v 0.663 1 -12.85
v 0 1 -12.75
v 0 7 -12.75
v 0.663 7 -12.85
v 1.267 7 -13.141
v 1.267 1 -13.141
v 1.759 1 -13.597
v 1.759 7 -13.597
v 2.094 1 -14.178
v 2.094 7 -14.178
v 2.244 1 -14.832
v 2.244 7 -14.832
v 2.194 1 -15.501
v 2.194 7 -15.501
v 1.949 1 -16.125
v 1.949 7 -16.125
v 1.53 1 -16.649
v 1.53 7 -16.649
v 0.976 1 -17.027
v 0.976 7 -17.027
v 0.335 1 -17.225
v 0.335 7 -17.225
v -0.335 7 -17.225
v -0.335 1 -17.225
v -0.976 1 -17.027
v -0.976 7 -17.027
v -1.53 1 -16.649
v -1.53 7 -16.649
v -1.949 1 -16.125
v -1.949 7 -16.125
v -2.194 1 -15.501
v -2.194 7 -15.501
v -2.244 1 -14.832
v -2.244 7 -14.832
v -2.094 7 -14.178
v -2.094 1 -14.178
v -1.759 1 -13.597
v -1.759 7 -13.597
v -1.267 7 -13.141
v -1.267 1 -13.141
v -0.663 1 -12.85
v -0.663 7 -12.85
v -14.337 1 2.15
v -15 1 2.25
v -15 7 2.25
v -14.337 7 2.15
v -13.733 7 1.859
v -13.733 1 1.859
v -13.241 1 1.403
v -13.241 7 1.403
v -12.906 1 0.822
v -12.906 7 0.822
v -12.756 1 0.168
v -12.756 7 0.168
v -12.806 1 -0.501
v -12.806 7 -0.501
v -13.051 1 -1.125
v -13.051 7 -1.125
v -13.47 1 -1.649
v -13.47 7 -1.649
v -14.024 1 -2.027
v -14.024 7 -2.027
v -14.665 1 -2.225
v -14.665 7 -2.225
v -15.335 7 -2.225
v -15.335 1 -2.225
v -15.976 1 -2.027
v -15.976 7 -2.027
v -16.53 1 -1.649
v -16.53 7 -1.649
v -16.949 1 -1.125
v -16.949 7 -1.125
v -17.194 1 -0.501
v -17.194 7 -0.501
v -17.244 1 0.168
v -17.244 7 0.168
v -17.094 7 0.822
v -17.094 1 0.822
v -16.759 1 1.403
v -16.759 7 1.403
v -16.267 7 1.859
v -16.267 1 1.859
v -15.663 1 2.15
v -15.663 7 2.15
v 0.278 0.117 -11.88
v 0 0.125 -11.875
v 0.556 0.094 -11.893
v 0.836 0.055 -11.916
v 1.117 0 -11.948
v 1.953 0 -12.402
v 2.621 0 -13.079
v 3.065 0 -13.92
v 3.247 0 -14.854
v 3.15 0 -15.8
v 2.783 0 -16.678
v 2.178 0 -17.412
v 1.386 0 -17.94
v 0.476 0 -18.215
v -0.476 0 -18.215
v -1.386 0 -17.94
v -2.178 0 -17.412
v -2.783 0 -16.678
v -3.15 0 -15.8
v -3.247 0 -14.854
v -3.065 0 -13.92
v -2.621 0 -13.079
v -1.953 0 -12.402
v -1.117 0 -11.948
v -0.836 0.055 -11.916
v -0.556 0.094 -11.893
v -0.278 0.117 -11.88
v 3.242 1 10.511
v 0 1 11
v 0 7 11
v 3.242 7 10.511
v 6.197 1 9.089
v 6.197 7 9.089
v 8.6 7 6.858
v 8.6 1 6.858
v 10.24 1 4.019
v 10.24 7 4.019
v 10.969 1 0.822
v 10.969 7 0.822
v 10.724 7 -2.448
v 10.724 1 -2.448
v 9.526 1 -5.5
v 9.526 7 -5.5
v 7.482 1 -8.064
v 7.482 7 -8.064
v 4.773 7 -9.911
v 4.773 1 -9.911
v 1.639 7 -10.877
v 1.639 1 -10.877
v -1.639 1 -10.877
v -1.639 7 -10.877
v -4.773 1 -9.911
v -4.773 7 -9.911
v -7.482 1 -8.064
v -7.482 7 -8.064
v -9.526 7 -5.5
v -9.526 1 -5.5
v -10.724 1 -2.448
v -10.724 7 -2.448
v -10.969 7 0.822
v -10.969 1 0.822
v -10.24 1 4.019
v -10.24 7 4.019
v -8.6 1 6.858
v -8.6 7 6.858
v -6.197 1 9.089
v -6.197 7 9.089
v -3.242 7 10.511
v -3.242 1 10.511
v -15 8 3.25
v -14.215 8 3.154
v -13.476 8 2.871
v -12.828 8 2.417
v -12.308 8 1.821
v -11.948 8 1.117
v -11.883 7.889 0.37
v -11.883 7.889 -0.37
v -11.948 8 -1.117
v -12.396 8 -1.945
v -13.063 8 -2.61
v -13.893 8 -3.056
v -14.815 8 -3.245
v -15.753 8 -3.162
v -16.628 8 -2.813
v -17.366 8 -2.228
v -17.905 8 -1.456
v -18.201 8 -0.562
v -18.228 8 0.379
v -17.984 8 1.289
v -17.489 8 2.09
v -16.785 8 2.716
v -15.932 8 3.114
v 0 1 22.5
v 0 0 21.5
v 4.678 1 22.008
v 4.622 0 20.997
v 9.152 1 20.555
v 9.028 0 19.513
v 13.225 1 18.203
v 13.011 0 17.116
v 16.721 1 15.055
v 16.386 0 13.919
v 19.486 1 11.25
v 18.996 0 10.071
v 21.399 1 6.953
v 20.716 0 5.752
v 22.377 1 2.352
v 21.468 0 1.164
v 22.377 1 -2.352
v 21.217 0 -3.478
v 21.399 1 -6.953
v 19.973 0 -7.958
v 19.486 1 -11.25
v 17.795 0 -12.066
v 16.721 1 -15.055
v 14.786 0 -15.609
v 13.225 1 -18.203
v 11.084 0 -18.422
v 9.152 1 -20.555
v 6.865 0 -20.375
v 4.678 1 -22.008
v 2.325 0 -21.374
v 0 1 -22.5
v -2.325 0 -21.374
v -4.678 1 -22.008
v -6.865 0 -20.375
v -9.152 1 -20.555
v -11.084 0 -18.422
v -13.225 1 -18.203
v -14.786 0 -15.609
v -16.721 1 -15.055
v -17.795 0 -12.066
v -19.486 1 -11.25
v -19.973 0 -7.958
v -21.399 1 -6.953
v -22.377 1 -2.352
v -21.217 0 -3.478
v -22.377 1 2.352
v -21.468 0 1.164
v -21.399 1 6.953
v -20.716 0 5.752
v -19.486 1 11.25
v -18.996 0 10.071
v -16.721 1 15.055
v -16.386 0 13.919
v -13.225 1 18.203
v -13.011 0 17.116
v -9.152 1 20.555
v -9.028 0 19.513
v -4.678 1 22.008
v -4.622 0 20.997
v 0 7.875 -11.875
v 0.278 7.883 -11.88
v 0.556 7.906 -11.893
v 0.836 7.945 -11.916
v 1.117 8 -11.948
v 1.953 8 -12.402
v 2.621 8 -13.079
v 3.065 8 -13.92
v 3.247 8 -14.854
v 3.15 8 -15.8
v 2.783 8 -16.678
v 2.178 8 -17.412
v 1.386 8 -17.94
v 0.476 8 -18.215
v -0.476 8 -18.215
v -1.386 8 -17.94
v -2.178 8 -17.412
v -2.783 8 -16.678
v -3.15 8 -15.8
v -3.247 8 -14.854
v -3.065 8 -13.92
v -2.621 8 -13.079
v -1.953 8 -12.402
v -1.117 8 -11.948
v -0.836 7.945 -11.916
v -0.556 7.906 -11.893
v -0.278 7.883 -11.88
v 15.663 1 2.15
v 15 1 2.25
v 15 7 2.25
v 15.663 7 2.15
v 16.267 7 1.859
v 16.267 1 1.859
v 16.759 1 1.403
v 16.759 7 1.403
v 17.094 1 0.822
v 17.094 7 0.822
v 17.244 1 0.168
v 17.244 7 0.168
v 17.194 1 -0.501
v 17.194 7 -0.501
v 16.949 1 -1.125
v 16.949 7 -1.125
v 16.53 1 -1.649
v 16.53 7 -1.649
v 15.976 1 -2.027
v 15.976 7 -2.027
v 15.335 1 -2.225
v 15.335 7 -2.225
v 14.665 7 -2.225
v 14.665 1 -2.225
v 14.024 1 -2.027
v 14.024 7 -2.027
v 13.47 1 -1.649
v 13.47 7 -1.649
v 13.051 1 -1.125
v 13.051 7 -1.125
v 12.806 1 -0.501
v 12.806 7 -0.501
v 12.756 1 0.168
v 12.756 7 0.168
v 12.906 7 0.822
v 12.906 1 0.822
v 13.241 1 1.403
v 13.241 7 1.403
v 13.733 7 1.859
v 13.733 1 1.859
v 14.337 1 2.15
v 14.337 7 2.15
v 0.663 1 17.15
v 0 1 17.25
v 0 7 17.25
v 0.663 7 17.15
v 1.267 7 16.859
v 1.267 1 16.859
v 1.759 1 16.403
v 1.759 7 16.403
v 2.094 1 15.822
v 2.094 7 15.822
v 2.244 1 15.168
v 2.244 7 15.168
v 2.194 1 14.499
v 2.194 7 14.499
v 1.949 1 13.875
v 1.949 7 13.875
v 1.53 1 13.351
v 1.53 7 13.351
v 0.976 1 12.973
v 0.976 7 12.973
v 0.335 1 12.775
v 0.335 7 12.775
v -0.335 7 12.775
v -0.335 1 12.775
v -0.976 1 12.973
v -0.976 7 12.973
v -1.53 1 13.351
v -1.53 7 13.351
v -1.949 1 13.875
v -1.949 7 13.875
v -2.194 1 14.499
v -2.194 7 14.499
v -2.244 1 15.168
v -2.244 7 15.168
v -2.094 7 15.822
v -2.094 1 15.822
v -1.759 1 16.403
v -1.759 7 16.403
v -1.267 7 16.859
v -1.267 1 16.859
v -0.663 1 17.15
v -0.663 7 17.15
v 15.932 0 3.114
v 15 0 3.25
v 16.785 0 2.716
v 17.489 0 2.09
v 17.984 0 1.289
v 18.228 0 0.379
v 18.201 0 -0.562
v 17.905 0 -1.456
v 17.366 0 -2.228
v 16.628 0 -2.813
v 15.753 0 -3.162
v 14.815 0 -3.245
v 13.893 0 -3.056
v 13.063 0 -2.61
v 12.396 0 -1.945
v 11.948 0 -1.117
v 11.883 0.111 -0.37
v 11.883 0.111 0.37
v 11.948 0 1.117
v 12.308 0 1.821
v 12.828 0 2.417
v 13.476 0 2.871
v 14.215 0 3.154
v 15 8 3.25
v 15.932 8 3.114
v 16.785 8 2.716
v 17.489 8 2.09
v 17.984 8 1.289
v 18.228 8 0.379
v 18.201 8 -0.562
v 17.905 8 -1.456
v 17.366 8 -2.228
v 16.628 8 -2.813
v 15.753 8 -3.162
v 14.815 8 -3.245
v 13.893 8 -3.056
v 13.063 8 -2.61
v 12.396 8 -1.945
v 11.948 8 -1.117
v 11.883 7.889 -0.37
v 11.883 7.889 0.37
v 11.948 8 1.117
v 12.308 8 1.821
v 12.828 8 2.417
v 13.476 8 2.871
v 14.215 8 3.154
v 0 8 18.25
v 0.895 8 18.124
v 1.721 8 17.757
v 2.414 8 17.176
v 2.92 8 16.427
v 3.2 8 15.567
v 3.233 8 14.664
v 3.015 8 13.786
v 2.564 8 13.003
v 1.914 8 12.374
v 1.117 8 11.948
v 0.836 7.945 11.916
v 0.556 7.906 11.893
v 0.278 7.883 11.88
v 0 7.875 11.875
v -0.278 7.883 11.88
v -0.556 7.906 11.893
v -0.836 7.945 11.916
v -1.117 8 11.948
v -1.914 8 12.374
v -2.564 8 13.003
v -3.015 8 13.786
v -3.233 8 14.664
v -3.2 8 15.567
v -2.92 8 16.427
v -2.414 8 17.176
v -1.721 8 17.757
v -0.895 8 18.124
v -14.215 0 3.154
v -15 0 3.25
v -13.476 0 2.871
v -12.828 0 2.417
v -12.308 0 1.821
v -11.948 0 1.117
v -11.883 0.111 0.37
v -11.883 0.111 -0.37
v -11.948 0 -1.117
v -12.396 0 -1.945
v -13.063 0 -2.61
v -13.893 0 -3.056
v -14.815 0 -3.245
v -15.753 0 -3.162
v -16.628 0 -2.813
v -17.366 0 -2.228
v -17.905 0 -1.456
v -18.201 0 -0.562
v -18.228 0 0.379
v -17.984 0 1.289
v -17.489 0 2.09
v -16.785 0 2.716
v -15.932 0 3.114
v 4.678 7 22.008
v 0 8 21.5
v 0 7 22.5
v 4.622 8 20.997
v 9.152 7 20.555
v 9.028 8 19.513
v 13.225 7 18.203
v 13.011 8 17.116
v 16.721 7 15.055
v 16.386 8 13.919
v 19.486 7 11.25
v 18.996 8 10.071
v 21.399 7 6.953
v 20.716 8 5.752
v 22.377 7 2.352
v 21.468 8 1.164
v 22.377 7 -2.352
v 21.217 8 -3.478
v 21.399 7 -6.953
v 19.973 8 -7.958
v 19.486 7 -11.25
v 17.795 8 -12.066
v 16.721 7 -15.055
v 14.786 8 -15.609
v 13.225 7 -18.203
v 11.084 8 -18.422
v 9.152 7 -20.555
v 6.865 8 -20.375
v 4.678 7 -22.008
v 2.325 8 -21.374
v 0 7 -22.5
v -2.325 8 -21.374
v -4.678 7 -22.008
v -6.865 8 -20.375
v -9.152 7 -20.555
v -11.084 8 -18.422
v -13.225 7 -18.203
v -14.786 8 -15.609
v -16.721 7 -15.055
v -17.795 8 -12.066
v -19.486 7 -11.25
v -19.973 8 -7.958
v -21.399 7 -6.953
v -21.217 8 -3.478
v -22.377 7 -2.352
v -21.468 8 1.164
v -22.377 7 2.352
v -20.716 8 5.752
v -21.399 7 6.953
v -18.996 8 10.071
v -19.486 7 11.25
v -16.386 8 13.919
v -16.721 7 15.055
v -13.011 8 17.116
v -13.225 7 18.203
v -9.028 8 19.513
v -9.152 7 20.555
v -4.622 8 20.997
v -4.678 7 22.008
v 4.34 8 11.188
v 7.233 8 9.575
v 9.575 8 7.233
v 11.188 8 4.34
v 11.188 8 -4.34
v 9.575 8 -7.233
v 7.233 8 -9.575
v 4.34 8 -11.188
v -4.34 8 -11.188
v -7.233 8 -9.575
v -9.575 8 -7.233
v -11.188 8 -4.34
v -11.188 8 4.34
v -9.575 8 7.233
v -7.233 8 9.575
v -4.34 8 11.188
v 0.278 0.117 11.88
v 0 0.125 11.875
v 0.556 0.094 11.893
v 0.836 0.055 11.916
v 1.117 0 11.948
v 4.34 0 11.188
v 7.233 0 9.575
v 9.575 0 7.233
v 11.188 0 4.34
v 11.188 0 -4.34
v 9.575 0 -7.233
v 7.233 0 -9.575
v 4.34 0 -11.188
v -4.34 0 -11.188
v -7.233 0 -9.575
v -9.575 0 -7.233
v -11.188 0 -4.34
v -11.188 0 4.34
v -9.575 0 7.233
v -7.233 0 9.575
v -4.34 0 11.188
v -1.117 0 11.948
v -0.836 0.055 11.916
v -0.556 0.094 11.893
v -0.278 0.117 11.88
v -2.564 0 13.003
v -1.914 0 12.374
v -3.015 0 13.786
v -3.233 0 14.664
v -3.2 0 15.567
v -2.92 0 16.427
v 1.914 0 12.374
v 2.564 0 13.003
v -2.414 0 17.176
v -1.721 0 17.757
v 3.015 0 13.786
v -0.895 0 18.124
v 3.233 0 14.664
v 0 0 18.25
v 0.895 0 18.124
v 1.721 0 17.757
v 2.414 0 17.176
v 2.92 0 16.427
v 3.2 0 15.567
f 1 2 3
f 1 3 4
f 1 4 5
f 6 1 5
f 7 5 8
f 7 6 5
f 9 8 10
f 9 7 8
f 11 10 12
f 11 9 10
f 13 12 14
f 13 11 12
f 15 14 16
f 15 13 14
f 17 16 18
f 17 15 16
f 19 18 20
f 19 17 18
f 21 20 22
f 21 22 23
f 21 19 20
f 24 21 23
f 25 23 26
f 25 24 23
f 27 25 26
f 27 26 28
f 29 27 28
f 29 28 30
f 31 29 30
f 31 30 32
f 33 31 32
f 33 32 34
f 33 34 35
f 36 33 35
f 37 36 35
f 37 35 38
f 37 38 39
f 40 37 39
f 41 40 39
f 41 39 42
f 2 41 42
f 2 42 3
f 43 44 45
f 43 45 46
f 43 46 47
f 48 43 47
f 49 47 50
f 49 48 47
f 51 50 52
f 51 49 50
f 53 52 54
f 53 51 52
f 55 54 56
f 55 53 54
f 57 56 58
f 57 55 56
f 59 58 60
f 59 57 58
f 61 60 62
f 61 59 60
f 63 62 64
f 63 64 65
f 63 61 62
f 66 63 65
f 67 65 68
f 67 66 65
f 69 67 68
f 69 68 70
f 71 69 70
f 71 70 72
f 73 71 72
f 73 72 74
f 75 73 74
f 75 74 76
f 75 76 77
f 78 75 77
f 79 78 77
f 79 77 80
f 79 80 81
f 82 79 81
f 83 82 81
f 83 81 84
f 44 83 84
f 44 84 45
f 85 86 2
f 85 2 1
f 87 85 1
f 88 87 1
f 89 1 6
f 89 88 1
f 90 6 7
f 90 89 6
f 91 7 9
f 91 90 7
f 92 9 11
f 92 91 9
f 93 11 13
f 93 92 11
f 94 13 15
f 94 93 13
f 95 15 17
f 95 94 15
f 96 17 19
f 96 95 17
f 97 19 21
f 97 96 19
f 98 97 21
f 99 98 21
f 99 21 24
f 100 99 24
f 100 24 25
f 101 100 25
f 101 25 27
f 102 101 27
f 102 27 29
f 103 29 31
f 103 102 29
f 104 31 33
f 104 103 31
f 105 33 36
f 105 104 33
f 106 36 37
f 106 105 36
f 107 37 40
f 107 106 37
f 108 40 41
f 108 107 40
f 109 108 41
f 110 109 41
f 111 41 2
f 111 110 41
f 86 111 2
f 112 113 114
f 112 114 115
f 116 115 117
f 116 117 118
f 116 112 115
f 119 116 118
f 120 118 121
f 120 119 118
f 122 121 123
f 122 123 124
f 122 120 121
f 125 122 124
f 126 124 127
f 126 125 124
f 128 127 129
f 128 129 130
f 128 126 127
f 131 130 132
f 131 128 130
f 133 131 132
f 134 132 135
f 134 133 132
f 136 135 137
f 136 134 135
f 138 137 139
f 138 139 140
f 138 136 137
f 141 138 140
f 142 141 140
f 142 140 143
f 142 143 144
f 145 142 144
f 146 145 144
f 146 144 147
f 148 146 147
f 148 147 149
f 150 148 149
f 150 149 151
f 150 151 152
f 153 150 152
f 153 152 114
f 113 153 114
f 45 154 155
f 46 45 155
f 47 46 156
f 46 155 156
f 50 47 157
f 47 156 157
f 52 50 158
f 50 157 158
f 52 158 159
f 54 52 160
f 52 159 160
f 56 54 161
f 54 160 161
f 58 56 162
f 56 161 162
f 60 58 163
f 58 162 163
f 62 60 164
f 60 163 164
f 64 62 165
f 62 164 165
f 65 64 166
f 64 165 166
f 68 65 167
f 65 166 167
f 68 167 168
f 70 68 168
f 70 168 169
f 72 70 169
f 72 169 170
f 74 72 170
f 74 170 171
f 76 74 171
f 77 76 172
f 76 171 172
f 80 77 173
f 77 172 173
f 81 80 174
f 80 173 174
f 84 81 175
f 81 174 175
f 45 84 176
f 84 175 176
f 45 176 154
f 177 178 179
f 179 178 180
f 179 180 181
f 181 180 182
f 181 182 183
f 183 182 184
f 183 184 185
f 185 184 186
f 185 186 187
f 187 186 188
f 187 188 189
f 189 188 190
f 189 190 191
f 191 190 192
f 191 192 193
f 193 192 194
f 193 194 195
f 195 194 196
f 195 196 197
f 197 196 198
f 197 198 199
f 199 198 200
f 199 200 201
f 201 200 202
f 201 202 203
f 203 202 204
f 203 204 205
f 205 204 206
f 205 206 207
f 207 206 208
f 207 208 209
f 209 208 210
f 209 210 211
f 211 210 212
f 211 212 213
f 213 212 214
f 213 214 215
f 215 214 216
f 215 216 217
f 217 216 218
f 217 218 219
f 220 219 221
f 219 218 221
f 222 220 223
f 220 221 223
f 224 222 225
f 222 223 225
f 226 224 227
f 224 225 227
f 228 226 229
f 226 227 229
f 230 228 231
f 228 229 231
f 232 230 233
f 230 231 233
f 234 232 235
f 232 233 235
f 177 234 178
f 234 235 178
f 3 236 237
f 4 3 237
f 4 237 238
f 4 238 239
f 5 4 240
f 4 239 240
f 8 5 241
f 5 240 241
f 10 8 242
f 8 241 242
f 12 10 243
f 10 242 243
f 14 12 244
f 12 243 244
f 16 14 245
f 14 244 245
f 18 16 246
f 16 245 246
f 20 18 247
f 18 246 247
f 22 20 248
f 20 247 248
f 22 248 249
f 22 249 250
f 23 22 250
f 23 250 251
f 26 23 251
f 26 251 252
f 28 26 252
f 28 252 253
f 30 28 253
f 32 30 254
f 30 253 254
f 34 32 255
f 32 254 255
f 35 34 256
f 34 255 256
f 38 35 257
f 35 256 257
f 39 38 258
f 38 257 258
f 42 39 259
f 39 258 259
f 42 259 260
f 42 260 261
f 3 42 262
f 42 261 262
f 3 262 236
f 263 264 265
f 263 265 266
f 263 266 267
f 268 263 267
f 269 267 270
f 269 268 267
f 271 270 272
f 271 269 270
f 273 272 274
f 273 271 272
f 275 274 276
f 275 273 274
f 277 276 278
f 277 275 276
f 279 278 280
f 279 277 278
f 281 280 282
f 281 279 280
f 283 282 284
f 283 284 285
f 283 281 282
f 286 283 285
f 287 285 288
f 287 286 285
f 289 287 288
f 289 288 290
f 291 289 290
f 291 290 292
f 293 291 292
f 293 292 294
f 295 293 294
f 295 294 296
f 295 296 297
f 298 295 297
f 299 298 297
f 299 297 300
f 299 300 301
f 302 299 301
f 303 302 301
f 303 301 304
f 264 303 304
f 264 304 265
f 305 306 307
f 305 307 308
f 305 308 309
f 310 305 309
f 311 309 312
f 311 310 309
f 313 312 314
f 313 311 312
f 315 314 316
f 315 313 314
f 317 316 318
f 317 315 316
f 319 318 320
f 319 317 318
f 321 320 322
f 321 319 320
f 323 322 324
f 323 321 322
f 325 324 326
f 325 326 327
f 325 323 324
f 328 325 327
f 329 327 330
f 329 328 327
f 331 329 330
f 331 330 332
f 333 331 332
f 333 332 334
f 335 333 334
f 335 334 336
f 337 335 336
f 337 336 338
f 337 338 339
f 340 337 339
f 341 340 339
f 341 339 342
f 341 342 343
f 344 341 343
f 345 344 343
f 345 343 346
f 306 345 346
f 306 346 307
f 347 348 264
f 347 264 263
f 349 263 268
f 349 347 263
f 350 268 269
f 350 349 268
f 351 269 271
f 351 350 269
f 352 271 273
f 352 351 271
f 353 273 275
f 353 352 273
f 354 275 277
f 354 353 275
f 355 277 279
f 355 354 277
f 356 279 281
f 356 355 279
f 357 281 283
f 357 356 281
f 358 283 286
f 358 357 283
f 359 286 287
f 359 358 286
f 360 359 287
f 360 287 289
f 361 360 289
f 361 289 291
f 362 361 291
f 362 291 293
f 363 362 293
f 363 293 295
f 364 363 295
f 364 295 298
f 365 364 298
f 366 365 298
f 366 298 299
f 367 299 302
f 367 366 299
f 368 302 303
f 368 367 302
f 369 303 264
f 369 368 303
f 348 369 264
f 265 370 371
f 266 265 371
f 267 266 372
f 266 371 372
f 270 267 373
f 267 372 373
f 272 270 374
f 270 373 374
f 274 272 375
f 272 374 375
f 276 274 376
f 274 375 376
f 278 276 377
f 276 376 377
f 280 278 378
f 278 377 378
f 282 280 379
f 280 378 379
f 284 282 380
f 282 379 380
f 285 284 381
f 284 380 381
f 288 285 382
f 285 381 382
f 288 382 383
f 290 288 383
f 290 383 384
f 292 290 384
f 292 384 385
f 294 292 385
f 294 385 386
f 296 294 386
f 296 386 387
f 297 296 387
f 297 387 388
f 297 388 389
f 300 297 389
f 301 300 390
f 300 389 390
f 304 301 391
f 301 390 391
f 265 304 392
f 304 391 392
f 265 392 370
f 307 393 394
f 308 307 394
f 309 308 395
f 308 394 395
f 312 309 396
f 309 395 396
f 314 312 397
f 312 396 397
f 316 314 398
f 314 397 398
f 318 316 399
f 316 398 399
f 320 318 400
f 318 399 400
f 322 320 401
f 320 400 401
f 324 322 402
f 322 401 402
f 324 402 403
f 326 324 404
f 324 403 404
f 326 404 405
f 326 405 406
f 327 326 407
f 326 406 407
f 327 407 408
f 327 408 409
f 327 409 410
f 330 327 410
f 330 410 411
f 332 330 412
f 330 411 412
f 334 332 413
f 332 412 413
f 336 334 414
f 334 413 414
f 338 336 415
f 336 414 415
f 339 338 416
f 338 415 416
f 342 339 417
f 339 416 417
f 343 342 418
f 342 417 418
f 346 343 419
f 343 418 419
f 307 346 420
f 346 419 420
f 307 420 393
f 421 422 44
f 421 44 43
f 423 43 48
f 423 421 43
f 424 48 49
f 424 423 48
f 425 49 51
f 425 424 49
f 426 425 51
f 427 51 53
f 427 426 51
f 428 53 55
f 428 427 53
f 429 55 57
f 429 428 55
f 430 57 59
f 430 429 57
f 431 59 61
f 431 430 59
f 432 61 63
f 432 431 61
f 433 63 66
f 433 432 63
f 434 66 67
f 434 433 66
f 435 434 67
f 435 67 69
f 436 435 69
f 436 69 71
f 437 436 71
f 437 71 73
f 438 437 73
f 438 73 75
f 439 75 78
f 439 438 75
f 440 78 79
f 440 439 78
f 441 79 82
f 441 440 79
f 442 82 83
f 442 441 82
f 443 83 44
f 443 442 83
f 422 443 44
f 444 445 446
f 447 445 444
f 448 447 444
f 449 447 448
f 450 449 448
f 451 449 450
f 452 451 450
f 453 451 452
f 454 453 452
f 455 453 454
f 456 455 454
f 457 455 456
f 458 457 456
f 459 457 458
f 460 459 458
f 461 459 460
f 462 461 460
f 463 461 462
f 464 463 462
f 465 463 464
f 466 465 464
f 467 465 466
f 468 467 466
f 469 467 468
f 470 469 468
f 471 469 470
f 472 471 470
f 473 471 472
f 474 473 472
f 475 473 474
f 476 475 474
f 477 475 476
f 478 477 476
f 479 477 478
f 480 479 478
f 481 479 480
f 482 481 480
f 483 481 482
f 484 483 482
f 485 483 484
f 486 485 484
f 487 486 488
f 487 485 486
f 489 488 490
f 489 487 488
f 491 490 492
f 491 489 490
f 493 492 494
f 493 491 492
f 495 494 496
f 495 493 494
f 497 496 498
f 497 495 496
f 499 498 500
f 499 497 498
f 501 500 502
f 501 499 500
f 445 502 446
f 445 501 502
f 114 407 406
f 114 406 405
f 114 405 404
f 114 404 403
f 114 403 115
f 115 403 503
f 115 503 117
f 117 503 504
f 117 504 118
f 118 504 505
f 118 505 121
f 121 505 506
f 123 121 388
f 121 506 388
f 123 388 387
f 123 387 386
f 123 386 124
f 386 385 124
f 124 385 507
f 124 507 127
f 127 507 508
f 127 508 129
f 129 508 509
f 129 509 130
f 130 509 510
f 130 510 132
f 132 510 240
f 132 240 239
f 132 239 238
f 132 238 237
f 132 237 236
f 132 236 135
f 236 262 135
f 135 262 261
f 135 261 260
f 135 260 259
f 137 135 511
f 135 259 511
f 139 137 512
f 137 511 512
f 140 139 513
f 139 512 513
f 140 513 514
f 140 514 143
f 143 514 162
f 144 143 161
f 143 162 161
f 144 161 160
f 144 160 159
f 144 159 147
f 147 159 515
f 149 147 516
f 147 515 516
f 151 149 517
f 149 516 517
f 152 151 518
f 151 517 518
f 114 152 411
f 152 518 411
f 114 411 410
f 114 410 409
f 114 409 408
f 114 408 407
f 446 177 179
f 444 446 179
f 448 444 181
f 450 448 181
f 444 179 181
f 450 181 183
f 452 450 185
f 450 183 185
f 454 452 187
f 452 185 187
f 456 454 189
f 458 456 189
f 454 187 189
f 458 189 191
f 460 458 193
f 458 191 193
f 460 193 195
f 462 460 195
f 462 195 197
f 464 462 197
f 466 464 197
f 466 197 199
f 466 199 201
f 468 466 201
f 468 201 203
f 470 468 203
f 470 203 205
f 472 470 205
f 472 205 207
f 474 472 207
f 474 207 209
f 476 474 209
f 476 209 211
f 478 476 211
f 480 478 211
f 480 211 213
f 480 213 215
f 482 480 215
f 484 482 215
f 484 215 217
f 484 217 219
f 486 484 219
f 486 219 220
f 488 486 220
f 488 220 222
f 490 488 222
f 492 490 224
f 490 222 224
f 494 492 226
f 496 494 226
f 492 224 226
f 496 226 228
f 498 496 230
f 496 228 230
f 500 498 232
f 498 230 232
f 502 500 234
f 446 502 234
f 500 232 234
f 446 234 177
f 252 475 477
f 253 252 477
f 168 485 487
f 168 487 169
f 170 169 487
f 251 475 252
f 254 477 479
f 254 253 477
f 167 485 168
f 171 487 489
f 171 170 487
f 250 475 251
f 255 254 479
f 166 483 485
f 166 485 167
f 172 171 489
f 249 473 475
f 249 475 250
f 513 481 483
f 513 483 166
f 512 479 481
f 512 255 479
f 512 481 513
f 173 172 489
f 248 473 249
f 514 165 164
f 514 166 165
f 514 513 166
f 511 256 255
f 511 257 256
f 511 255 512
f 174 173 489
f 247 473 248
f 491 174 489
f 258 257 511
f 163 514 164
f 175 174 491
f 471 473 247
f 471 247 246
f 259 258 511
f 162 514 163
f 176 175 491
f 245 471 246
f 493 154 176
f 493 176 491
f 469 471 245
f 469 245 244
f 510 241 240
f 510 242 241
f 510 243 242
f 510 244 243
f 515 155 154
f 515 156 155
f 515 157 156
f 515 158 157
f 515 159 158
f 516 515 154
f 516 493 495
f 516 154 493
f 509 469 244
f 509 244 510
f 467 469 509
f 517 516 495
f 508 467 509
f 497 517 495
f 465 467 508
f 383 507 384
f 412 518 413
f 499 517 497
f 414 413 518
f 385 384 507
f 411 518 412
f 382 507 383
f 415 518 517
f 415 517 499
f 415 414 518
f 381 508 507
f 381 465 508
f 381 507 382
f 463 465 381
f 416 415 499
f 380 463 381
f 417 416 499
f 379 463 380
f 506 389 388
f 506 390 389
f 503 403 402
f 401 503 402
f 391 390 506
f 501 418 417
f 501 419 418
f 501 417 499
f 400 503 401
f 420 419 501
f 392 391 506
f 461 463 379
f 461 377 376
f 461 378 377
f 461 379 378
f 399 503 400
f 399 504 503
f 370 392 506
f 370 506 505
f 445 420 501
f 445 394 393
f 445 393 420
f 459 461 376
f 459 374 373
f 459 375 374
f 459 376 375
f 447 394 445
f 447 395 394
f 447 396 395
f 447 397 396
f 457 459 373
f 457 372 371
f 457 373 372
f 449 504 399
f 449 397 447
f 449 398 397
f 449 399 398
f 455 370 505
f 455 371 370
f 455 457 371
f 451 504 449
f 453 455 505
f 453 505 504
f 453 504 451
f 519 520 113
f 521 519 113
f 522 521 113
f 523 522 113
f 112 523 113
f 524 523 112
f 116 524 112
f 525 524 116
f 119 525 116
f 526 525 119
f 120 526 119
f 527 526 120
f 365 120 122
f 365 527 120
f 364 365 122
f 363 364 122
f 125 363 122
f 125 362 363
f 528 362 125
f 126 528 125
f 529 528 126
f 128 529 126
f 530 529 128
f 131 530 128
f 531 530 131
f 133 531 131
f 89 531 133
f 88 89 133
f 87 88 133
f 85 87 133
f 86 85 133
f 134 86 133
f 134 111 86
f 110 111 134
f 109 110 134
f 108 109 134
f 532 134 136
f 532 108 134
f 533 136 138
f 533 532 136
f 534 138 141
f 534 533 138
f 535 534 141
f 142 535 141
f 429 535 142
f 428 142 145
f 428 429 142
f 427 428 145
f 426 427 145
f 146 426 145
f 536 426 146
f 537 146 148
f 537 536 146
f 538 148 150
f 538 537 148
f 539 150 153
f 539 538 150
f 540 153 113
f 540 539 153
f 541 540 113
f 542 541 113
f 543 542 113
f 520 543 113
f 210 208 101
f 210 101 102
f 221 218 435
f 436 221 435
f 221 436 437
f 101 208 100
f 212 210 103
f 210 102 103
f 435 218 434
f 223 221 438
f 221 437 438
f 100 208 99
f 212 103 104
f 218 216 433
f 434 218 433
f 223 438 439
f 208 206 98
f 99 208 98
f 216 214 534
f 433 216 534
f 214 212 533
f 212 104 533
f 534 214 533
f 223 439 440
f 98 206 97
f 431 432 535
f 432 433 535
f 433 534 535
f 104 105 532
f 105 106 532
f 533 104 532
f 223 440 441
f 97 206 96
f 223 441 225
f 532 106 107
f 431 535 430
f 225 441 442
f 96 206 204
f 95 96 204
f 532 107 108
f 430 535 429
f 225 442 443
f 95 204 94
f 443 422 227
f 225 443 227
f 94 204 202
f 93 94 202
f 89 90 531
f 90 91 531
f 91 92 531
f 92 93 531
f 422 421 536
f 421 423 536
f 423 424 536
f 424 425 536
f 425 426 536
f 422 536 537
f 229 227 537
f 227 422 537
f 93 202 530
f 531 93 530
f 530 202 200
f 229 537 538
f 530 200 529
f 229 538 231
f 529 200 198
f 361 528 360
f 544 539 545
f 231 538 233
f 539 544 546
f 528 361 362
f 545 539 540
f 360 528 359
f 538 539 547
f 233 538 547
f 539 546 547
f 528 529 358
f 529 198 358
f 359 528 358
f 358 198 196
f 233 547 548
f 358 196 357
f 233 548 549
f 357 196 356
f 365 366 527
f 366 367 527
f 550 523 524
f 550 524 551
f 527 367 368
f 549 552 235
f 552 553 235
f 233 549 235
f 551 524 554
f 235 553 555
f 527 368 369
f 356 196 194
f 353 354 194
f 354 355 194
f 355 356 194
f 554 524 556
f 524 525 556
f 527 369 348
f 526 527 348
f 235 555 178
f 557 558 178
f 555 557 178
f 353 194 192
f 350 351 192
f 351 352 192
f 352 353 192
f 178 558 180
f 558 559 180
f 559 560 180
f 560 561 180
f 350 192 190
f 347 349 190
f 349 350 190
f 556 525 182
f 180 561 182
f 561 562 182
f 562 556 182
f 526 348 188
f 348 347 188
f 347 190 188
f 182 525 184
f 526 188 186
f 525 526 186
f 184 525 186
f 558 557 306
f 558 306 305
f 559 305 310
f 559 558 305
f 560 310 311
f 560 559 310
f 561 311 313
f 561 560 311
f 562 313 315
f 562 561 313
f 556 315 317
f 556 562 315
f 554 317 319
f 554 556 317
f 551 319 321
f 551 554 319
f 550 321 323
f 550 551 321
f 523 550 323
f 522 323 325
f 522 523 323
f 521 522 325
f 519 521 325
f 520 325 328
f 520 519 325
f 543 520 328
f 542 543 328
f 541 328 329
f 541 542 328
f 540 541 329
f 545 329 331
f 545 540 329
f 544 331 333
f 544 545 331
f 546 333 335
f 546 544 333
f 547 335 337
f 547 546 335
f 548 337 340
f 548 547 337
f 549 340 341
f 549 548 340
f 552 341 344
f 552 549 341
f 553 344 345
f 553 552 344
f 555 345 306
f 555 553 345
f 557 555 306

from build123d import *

# Parameters (mm, degrees)
SKETCH1_R           = 22.5
SKETCH1_R_2         = 11
SKETCH1_R_3         = 2.25
BOSS_EXTRUDE1_DEPTH = 8
CHAMFER1_SIZE       = 1


with BuildPart() as part:
    # Sketch1 → Boss-Extrude1 (new body)
    with BuildSketch(Plane(origin=(0, 0, 0), x_dir=(1, 0, 0), z_dir=(0, 1, 0))):
        with Locations(Location((0, 0, 0), (0, 0, 270))):
            Circle(SKETCH1_R)
        with Locations(Location((0, 0, 0), (0, 0, 270))):
            Circle(SKETCH1_R_2, mode=Mode.SUBTRACT)
        with Locations(Location((-15, 0, 0), (0, 0, 270))):
            Circle(SKETCH1_R_3, mode=Mode.SUBTRACT)
        with Locations(Location((15, 0, 0), (0, 0, 270))):
            Circle(SKETCH1_R_3, mode=Mode.SUBTRACT)
        with Locations(Location((0, -15, 0), (0, 0, 270))):
            Circle(SKETCH1_R_3, mode=Mode.SUBTRACT)
        with Locations(Location((0, 15, 0), (0, 0, 270))):
            Circle(SKETCH1_R_3, mode=Mode.SUBTRACT)
    extrude(amount=BOSS_EXTRUDE1_DEPTH)

    # Chamfer1
    # the kernel refuses this chamfer: 1 mm, written as the material it takes off along each edge
    with BuildSketch(Plane(origin=(15, 0, 0), x_dir=(0, 0, 1), z_dir=(-1, 0, 0))) as chamfer1_piece_1:
        Polygon((2.25, CHAMFER1_SIZE), (2.25 + CHAMFER1_SIZE, 0), (2.25, 0), align=None)
    revolve(axis=Axis((15, 0, 0), (0, 1, 0)), mode=Mode.SUBTRACT)
    with BuildSketch(Plane(origin=(15, 8, 0), x_dir=(0, 0, 1), z_dir=(-1, 0, 0))) as chamfer1_piece_2:
        Polygon((2.25, -CHAMFER1_SIZE), (2.25 + CHAMFER1_SIZE, 0), (2.25, 0), align=None)
    revolve(axis=Axis((15, 8, 0), (0, 1, 0)), mode=Mode.SUBTRACT)
    with BuildSketch(Plane(origin=(0, 0, -15), x_dir=(0, 0, 1), z_dir=(-1, 0, 0))) as chamfer1_piece_3:
        Polygon((2.25, CHAMFER1_SIZE), (2.25 + CHAMFER1_SIZE, 0), (2.25, 0), align=None)
    revolve(axis=Axis((0, 0, -15), (0, 1, 0)), mode=Mode.SUBTRACT)
    with BuildSketch(Plane(origin=(0, 8, -15), x_dir=(0, 0, 1), z_dir=(-1, 0, 0))) as chamfer1_piece_4:
        Polygon((2.25, -CHAMFER1_SIZE), (2.25 + CHAMFER1_SIZE, 0), (2.25, 0), align=None)
    revolve(axis=Axis((0, 8, -15), (0, 1, 0)), mode=Mode.SUBTRACT)
    with BuildSketch(Plane(origin=(0, 0, 0), x_dir=(0, 0, 1), z_dir=(-1, 0, 0))) as chamfer1_piece_5:
        Polygon((22.5, CHAMFER1_SIZE), (22.5 - CHAMFER1_SIZE, 0), (22.5, 0), align=None)
    revolve(axis=Axis((0, 0, 0), (0, 1, 0)), mode=Mode.SUBTRACT)
    with BuildSketch(Plane(origin=(-15, 0, 0), x_dir=(0, 0, 1), z_dir=(-1, 0, 0))) as chamfer1_piece_6:
        Polygon((2.25, CHAMFER1_SIZE), (2.25 + CHAMFER1_SIZE, 0), (2.25, 0), align=None)
    revolve(axis=Axis((-15, 0, 0), (0, 1, 0)), mode=Mode.SUBTRACT)
    with BuildSketch(Plane(origin=(-15, 8, 0), x_dir=(0, 0, 1), z_dir=(-1, 0, 0))) as chamfer1_piece_7:
        Polygon((2.25, -CHAMFER1_SIZE), (2.25 + CHAMFER1_SIZE, 0), (2.25, 0), align=None)
    revolve(axis=Axis((-15, 8, 0), (0, 1, 0)), mode=Mode.SUBTRACT)
    with BuildSketch(Plane(origin=(0, 8, 0), x_dir=(0, 0, 1), z_dir=(-1, 0, 0))) as chamfer1_piece_8:
        Polygon((22.5, -CHAMFER1_SIZE), (22.5 - CHAMFER1_SIZE, 0), (22.5, 0), align=None)
    revolve(axis=Axis((0, 8, 0), (0, 1, 0)), mode=Mode.SUBTRACT)
    with BuildSketch(Plane(origin=(0, 0, 0), x_dir=(0, 0, 1), z_dir=(-1, 0, 0))) as chamfer1_piece_9:
        Polygon((11, CHAMFER1_SIZE), (11 + CHAMFER1_SIZE, 0), (11, 0), align=None)
    revolve(axis=Axis((0, 0, 0), (0, 1, 0)), mode=Mode.SUBTRACT)
    with BuildSketch(Plane(origin=(0, 8, 0), x_dir=(0, 0, 1), z_dir=(-1, 0, 0))) as chamfer1_piece_10:
        Polygon((11, -CHAMFER1_SIZE), (11 + CHAMFER1_SIZE, 0), (11, 0), align=None)
    revolve(axis=Axis((0, 8, 0), (0, 1, 0)), mode=Mode.SUBTRACT)
    with BuildSketch(Plane(origin=(0, 0, 15), x_dir=(0, 0, 1), z_dir=(-1, 0, 0))) as chamfer1_piece_11:
        Polygon((2.25, CHAMFER1_SIZE), (2.25 + CHAMFER1_SIZE, 0), (2.25, 0), align=None)
    revolve(axis=Axis((0, 0, 15), (0, 1, 0)), mode=Mode.SUBTRACT)
    with BuildSketch(Plane(origin=(0, 8, 15), x_dir=(0, 0, 1), z_dir=(-1, 0, 0))) as chamfer1_piece_12:
        Polygon((2.25, -CHAMFER1_SIZE), (2.25 + CHAMFER1_SIZE, 0), (2.25, 0), align=None)
    revolve(axis=Axis((0, 8, 15), (0, 1, 0)), mode=Mode.SUBTRACT)


solid = part.part
